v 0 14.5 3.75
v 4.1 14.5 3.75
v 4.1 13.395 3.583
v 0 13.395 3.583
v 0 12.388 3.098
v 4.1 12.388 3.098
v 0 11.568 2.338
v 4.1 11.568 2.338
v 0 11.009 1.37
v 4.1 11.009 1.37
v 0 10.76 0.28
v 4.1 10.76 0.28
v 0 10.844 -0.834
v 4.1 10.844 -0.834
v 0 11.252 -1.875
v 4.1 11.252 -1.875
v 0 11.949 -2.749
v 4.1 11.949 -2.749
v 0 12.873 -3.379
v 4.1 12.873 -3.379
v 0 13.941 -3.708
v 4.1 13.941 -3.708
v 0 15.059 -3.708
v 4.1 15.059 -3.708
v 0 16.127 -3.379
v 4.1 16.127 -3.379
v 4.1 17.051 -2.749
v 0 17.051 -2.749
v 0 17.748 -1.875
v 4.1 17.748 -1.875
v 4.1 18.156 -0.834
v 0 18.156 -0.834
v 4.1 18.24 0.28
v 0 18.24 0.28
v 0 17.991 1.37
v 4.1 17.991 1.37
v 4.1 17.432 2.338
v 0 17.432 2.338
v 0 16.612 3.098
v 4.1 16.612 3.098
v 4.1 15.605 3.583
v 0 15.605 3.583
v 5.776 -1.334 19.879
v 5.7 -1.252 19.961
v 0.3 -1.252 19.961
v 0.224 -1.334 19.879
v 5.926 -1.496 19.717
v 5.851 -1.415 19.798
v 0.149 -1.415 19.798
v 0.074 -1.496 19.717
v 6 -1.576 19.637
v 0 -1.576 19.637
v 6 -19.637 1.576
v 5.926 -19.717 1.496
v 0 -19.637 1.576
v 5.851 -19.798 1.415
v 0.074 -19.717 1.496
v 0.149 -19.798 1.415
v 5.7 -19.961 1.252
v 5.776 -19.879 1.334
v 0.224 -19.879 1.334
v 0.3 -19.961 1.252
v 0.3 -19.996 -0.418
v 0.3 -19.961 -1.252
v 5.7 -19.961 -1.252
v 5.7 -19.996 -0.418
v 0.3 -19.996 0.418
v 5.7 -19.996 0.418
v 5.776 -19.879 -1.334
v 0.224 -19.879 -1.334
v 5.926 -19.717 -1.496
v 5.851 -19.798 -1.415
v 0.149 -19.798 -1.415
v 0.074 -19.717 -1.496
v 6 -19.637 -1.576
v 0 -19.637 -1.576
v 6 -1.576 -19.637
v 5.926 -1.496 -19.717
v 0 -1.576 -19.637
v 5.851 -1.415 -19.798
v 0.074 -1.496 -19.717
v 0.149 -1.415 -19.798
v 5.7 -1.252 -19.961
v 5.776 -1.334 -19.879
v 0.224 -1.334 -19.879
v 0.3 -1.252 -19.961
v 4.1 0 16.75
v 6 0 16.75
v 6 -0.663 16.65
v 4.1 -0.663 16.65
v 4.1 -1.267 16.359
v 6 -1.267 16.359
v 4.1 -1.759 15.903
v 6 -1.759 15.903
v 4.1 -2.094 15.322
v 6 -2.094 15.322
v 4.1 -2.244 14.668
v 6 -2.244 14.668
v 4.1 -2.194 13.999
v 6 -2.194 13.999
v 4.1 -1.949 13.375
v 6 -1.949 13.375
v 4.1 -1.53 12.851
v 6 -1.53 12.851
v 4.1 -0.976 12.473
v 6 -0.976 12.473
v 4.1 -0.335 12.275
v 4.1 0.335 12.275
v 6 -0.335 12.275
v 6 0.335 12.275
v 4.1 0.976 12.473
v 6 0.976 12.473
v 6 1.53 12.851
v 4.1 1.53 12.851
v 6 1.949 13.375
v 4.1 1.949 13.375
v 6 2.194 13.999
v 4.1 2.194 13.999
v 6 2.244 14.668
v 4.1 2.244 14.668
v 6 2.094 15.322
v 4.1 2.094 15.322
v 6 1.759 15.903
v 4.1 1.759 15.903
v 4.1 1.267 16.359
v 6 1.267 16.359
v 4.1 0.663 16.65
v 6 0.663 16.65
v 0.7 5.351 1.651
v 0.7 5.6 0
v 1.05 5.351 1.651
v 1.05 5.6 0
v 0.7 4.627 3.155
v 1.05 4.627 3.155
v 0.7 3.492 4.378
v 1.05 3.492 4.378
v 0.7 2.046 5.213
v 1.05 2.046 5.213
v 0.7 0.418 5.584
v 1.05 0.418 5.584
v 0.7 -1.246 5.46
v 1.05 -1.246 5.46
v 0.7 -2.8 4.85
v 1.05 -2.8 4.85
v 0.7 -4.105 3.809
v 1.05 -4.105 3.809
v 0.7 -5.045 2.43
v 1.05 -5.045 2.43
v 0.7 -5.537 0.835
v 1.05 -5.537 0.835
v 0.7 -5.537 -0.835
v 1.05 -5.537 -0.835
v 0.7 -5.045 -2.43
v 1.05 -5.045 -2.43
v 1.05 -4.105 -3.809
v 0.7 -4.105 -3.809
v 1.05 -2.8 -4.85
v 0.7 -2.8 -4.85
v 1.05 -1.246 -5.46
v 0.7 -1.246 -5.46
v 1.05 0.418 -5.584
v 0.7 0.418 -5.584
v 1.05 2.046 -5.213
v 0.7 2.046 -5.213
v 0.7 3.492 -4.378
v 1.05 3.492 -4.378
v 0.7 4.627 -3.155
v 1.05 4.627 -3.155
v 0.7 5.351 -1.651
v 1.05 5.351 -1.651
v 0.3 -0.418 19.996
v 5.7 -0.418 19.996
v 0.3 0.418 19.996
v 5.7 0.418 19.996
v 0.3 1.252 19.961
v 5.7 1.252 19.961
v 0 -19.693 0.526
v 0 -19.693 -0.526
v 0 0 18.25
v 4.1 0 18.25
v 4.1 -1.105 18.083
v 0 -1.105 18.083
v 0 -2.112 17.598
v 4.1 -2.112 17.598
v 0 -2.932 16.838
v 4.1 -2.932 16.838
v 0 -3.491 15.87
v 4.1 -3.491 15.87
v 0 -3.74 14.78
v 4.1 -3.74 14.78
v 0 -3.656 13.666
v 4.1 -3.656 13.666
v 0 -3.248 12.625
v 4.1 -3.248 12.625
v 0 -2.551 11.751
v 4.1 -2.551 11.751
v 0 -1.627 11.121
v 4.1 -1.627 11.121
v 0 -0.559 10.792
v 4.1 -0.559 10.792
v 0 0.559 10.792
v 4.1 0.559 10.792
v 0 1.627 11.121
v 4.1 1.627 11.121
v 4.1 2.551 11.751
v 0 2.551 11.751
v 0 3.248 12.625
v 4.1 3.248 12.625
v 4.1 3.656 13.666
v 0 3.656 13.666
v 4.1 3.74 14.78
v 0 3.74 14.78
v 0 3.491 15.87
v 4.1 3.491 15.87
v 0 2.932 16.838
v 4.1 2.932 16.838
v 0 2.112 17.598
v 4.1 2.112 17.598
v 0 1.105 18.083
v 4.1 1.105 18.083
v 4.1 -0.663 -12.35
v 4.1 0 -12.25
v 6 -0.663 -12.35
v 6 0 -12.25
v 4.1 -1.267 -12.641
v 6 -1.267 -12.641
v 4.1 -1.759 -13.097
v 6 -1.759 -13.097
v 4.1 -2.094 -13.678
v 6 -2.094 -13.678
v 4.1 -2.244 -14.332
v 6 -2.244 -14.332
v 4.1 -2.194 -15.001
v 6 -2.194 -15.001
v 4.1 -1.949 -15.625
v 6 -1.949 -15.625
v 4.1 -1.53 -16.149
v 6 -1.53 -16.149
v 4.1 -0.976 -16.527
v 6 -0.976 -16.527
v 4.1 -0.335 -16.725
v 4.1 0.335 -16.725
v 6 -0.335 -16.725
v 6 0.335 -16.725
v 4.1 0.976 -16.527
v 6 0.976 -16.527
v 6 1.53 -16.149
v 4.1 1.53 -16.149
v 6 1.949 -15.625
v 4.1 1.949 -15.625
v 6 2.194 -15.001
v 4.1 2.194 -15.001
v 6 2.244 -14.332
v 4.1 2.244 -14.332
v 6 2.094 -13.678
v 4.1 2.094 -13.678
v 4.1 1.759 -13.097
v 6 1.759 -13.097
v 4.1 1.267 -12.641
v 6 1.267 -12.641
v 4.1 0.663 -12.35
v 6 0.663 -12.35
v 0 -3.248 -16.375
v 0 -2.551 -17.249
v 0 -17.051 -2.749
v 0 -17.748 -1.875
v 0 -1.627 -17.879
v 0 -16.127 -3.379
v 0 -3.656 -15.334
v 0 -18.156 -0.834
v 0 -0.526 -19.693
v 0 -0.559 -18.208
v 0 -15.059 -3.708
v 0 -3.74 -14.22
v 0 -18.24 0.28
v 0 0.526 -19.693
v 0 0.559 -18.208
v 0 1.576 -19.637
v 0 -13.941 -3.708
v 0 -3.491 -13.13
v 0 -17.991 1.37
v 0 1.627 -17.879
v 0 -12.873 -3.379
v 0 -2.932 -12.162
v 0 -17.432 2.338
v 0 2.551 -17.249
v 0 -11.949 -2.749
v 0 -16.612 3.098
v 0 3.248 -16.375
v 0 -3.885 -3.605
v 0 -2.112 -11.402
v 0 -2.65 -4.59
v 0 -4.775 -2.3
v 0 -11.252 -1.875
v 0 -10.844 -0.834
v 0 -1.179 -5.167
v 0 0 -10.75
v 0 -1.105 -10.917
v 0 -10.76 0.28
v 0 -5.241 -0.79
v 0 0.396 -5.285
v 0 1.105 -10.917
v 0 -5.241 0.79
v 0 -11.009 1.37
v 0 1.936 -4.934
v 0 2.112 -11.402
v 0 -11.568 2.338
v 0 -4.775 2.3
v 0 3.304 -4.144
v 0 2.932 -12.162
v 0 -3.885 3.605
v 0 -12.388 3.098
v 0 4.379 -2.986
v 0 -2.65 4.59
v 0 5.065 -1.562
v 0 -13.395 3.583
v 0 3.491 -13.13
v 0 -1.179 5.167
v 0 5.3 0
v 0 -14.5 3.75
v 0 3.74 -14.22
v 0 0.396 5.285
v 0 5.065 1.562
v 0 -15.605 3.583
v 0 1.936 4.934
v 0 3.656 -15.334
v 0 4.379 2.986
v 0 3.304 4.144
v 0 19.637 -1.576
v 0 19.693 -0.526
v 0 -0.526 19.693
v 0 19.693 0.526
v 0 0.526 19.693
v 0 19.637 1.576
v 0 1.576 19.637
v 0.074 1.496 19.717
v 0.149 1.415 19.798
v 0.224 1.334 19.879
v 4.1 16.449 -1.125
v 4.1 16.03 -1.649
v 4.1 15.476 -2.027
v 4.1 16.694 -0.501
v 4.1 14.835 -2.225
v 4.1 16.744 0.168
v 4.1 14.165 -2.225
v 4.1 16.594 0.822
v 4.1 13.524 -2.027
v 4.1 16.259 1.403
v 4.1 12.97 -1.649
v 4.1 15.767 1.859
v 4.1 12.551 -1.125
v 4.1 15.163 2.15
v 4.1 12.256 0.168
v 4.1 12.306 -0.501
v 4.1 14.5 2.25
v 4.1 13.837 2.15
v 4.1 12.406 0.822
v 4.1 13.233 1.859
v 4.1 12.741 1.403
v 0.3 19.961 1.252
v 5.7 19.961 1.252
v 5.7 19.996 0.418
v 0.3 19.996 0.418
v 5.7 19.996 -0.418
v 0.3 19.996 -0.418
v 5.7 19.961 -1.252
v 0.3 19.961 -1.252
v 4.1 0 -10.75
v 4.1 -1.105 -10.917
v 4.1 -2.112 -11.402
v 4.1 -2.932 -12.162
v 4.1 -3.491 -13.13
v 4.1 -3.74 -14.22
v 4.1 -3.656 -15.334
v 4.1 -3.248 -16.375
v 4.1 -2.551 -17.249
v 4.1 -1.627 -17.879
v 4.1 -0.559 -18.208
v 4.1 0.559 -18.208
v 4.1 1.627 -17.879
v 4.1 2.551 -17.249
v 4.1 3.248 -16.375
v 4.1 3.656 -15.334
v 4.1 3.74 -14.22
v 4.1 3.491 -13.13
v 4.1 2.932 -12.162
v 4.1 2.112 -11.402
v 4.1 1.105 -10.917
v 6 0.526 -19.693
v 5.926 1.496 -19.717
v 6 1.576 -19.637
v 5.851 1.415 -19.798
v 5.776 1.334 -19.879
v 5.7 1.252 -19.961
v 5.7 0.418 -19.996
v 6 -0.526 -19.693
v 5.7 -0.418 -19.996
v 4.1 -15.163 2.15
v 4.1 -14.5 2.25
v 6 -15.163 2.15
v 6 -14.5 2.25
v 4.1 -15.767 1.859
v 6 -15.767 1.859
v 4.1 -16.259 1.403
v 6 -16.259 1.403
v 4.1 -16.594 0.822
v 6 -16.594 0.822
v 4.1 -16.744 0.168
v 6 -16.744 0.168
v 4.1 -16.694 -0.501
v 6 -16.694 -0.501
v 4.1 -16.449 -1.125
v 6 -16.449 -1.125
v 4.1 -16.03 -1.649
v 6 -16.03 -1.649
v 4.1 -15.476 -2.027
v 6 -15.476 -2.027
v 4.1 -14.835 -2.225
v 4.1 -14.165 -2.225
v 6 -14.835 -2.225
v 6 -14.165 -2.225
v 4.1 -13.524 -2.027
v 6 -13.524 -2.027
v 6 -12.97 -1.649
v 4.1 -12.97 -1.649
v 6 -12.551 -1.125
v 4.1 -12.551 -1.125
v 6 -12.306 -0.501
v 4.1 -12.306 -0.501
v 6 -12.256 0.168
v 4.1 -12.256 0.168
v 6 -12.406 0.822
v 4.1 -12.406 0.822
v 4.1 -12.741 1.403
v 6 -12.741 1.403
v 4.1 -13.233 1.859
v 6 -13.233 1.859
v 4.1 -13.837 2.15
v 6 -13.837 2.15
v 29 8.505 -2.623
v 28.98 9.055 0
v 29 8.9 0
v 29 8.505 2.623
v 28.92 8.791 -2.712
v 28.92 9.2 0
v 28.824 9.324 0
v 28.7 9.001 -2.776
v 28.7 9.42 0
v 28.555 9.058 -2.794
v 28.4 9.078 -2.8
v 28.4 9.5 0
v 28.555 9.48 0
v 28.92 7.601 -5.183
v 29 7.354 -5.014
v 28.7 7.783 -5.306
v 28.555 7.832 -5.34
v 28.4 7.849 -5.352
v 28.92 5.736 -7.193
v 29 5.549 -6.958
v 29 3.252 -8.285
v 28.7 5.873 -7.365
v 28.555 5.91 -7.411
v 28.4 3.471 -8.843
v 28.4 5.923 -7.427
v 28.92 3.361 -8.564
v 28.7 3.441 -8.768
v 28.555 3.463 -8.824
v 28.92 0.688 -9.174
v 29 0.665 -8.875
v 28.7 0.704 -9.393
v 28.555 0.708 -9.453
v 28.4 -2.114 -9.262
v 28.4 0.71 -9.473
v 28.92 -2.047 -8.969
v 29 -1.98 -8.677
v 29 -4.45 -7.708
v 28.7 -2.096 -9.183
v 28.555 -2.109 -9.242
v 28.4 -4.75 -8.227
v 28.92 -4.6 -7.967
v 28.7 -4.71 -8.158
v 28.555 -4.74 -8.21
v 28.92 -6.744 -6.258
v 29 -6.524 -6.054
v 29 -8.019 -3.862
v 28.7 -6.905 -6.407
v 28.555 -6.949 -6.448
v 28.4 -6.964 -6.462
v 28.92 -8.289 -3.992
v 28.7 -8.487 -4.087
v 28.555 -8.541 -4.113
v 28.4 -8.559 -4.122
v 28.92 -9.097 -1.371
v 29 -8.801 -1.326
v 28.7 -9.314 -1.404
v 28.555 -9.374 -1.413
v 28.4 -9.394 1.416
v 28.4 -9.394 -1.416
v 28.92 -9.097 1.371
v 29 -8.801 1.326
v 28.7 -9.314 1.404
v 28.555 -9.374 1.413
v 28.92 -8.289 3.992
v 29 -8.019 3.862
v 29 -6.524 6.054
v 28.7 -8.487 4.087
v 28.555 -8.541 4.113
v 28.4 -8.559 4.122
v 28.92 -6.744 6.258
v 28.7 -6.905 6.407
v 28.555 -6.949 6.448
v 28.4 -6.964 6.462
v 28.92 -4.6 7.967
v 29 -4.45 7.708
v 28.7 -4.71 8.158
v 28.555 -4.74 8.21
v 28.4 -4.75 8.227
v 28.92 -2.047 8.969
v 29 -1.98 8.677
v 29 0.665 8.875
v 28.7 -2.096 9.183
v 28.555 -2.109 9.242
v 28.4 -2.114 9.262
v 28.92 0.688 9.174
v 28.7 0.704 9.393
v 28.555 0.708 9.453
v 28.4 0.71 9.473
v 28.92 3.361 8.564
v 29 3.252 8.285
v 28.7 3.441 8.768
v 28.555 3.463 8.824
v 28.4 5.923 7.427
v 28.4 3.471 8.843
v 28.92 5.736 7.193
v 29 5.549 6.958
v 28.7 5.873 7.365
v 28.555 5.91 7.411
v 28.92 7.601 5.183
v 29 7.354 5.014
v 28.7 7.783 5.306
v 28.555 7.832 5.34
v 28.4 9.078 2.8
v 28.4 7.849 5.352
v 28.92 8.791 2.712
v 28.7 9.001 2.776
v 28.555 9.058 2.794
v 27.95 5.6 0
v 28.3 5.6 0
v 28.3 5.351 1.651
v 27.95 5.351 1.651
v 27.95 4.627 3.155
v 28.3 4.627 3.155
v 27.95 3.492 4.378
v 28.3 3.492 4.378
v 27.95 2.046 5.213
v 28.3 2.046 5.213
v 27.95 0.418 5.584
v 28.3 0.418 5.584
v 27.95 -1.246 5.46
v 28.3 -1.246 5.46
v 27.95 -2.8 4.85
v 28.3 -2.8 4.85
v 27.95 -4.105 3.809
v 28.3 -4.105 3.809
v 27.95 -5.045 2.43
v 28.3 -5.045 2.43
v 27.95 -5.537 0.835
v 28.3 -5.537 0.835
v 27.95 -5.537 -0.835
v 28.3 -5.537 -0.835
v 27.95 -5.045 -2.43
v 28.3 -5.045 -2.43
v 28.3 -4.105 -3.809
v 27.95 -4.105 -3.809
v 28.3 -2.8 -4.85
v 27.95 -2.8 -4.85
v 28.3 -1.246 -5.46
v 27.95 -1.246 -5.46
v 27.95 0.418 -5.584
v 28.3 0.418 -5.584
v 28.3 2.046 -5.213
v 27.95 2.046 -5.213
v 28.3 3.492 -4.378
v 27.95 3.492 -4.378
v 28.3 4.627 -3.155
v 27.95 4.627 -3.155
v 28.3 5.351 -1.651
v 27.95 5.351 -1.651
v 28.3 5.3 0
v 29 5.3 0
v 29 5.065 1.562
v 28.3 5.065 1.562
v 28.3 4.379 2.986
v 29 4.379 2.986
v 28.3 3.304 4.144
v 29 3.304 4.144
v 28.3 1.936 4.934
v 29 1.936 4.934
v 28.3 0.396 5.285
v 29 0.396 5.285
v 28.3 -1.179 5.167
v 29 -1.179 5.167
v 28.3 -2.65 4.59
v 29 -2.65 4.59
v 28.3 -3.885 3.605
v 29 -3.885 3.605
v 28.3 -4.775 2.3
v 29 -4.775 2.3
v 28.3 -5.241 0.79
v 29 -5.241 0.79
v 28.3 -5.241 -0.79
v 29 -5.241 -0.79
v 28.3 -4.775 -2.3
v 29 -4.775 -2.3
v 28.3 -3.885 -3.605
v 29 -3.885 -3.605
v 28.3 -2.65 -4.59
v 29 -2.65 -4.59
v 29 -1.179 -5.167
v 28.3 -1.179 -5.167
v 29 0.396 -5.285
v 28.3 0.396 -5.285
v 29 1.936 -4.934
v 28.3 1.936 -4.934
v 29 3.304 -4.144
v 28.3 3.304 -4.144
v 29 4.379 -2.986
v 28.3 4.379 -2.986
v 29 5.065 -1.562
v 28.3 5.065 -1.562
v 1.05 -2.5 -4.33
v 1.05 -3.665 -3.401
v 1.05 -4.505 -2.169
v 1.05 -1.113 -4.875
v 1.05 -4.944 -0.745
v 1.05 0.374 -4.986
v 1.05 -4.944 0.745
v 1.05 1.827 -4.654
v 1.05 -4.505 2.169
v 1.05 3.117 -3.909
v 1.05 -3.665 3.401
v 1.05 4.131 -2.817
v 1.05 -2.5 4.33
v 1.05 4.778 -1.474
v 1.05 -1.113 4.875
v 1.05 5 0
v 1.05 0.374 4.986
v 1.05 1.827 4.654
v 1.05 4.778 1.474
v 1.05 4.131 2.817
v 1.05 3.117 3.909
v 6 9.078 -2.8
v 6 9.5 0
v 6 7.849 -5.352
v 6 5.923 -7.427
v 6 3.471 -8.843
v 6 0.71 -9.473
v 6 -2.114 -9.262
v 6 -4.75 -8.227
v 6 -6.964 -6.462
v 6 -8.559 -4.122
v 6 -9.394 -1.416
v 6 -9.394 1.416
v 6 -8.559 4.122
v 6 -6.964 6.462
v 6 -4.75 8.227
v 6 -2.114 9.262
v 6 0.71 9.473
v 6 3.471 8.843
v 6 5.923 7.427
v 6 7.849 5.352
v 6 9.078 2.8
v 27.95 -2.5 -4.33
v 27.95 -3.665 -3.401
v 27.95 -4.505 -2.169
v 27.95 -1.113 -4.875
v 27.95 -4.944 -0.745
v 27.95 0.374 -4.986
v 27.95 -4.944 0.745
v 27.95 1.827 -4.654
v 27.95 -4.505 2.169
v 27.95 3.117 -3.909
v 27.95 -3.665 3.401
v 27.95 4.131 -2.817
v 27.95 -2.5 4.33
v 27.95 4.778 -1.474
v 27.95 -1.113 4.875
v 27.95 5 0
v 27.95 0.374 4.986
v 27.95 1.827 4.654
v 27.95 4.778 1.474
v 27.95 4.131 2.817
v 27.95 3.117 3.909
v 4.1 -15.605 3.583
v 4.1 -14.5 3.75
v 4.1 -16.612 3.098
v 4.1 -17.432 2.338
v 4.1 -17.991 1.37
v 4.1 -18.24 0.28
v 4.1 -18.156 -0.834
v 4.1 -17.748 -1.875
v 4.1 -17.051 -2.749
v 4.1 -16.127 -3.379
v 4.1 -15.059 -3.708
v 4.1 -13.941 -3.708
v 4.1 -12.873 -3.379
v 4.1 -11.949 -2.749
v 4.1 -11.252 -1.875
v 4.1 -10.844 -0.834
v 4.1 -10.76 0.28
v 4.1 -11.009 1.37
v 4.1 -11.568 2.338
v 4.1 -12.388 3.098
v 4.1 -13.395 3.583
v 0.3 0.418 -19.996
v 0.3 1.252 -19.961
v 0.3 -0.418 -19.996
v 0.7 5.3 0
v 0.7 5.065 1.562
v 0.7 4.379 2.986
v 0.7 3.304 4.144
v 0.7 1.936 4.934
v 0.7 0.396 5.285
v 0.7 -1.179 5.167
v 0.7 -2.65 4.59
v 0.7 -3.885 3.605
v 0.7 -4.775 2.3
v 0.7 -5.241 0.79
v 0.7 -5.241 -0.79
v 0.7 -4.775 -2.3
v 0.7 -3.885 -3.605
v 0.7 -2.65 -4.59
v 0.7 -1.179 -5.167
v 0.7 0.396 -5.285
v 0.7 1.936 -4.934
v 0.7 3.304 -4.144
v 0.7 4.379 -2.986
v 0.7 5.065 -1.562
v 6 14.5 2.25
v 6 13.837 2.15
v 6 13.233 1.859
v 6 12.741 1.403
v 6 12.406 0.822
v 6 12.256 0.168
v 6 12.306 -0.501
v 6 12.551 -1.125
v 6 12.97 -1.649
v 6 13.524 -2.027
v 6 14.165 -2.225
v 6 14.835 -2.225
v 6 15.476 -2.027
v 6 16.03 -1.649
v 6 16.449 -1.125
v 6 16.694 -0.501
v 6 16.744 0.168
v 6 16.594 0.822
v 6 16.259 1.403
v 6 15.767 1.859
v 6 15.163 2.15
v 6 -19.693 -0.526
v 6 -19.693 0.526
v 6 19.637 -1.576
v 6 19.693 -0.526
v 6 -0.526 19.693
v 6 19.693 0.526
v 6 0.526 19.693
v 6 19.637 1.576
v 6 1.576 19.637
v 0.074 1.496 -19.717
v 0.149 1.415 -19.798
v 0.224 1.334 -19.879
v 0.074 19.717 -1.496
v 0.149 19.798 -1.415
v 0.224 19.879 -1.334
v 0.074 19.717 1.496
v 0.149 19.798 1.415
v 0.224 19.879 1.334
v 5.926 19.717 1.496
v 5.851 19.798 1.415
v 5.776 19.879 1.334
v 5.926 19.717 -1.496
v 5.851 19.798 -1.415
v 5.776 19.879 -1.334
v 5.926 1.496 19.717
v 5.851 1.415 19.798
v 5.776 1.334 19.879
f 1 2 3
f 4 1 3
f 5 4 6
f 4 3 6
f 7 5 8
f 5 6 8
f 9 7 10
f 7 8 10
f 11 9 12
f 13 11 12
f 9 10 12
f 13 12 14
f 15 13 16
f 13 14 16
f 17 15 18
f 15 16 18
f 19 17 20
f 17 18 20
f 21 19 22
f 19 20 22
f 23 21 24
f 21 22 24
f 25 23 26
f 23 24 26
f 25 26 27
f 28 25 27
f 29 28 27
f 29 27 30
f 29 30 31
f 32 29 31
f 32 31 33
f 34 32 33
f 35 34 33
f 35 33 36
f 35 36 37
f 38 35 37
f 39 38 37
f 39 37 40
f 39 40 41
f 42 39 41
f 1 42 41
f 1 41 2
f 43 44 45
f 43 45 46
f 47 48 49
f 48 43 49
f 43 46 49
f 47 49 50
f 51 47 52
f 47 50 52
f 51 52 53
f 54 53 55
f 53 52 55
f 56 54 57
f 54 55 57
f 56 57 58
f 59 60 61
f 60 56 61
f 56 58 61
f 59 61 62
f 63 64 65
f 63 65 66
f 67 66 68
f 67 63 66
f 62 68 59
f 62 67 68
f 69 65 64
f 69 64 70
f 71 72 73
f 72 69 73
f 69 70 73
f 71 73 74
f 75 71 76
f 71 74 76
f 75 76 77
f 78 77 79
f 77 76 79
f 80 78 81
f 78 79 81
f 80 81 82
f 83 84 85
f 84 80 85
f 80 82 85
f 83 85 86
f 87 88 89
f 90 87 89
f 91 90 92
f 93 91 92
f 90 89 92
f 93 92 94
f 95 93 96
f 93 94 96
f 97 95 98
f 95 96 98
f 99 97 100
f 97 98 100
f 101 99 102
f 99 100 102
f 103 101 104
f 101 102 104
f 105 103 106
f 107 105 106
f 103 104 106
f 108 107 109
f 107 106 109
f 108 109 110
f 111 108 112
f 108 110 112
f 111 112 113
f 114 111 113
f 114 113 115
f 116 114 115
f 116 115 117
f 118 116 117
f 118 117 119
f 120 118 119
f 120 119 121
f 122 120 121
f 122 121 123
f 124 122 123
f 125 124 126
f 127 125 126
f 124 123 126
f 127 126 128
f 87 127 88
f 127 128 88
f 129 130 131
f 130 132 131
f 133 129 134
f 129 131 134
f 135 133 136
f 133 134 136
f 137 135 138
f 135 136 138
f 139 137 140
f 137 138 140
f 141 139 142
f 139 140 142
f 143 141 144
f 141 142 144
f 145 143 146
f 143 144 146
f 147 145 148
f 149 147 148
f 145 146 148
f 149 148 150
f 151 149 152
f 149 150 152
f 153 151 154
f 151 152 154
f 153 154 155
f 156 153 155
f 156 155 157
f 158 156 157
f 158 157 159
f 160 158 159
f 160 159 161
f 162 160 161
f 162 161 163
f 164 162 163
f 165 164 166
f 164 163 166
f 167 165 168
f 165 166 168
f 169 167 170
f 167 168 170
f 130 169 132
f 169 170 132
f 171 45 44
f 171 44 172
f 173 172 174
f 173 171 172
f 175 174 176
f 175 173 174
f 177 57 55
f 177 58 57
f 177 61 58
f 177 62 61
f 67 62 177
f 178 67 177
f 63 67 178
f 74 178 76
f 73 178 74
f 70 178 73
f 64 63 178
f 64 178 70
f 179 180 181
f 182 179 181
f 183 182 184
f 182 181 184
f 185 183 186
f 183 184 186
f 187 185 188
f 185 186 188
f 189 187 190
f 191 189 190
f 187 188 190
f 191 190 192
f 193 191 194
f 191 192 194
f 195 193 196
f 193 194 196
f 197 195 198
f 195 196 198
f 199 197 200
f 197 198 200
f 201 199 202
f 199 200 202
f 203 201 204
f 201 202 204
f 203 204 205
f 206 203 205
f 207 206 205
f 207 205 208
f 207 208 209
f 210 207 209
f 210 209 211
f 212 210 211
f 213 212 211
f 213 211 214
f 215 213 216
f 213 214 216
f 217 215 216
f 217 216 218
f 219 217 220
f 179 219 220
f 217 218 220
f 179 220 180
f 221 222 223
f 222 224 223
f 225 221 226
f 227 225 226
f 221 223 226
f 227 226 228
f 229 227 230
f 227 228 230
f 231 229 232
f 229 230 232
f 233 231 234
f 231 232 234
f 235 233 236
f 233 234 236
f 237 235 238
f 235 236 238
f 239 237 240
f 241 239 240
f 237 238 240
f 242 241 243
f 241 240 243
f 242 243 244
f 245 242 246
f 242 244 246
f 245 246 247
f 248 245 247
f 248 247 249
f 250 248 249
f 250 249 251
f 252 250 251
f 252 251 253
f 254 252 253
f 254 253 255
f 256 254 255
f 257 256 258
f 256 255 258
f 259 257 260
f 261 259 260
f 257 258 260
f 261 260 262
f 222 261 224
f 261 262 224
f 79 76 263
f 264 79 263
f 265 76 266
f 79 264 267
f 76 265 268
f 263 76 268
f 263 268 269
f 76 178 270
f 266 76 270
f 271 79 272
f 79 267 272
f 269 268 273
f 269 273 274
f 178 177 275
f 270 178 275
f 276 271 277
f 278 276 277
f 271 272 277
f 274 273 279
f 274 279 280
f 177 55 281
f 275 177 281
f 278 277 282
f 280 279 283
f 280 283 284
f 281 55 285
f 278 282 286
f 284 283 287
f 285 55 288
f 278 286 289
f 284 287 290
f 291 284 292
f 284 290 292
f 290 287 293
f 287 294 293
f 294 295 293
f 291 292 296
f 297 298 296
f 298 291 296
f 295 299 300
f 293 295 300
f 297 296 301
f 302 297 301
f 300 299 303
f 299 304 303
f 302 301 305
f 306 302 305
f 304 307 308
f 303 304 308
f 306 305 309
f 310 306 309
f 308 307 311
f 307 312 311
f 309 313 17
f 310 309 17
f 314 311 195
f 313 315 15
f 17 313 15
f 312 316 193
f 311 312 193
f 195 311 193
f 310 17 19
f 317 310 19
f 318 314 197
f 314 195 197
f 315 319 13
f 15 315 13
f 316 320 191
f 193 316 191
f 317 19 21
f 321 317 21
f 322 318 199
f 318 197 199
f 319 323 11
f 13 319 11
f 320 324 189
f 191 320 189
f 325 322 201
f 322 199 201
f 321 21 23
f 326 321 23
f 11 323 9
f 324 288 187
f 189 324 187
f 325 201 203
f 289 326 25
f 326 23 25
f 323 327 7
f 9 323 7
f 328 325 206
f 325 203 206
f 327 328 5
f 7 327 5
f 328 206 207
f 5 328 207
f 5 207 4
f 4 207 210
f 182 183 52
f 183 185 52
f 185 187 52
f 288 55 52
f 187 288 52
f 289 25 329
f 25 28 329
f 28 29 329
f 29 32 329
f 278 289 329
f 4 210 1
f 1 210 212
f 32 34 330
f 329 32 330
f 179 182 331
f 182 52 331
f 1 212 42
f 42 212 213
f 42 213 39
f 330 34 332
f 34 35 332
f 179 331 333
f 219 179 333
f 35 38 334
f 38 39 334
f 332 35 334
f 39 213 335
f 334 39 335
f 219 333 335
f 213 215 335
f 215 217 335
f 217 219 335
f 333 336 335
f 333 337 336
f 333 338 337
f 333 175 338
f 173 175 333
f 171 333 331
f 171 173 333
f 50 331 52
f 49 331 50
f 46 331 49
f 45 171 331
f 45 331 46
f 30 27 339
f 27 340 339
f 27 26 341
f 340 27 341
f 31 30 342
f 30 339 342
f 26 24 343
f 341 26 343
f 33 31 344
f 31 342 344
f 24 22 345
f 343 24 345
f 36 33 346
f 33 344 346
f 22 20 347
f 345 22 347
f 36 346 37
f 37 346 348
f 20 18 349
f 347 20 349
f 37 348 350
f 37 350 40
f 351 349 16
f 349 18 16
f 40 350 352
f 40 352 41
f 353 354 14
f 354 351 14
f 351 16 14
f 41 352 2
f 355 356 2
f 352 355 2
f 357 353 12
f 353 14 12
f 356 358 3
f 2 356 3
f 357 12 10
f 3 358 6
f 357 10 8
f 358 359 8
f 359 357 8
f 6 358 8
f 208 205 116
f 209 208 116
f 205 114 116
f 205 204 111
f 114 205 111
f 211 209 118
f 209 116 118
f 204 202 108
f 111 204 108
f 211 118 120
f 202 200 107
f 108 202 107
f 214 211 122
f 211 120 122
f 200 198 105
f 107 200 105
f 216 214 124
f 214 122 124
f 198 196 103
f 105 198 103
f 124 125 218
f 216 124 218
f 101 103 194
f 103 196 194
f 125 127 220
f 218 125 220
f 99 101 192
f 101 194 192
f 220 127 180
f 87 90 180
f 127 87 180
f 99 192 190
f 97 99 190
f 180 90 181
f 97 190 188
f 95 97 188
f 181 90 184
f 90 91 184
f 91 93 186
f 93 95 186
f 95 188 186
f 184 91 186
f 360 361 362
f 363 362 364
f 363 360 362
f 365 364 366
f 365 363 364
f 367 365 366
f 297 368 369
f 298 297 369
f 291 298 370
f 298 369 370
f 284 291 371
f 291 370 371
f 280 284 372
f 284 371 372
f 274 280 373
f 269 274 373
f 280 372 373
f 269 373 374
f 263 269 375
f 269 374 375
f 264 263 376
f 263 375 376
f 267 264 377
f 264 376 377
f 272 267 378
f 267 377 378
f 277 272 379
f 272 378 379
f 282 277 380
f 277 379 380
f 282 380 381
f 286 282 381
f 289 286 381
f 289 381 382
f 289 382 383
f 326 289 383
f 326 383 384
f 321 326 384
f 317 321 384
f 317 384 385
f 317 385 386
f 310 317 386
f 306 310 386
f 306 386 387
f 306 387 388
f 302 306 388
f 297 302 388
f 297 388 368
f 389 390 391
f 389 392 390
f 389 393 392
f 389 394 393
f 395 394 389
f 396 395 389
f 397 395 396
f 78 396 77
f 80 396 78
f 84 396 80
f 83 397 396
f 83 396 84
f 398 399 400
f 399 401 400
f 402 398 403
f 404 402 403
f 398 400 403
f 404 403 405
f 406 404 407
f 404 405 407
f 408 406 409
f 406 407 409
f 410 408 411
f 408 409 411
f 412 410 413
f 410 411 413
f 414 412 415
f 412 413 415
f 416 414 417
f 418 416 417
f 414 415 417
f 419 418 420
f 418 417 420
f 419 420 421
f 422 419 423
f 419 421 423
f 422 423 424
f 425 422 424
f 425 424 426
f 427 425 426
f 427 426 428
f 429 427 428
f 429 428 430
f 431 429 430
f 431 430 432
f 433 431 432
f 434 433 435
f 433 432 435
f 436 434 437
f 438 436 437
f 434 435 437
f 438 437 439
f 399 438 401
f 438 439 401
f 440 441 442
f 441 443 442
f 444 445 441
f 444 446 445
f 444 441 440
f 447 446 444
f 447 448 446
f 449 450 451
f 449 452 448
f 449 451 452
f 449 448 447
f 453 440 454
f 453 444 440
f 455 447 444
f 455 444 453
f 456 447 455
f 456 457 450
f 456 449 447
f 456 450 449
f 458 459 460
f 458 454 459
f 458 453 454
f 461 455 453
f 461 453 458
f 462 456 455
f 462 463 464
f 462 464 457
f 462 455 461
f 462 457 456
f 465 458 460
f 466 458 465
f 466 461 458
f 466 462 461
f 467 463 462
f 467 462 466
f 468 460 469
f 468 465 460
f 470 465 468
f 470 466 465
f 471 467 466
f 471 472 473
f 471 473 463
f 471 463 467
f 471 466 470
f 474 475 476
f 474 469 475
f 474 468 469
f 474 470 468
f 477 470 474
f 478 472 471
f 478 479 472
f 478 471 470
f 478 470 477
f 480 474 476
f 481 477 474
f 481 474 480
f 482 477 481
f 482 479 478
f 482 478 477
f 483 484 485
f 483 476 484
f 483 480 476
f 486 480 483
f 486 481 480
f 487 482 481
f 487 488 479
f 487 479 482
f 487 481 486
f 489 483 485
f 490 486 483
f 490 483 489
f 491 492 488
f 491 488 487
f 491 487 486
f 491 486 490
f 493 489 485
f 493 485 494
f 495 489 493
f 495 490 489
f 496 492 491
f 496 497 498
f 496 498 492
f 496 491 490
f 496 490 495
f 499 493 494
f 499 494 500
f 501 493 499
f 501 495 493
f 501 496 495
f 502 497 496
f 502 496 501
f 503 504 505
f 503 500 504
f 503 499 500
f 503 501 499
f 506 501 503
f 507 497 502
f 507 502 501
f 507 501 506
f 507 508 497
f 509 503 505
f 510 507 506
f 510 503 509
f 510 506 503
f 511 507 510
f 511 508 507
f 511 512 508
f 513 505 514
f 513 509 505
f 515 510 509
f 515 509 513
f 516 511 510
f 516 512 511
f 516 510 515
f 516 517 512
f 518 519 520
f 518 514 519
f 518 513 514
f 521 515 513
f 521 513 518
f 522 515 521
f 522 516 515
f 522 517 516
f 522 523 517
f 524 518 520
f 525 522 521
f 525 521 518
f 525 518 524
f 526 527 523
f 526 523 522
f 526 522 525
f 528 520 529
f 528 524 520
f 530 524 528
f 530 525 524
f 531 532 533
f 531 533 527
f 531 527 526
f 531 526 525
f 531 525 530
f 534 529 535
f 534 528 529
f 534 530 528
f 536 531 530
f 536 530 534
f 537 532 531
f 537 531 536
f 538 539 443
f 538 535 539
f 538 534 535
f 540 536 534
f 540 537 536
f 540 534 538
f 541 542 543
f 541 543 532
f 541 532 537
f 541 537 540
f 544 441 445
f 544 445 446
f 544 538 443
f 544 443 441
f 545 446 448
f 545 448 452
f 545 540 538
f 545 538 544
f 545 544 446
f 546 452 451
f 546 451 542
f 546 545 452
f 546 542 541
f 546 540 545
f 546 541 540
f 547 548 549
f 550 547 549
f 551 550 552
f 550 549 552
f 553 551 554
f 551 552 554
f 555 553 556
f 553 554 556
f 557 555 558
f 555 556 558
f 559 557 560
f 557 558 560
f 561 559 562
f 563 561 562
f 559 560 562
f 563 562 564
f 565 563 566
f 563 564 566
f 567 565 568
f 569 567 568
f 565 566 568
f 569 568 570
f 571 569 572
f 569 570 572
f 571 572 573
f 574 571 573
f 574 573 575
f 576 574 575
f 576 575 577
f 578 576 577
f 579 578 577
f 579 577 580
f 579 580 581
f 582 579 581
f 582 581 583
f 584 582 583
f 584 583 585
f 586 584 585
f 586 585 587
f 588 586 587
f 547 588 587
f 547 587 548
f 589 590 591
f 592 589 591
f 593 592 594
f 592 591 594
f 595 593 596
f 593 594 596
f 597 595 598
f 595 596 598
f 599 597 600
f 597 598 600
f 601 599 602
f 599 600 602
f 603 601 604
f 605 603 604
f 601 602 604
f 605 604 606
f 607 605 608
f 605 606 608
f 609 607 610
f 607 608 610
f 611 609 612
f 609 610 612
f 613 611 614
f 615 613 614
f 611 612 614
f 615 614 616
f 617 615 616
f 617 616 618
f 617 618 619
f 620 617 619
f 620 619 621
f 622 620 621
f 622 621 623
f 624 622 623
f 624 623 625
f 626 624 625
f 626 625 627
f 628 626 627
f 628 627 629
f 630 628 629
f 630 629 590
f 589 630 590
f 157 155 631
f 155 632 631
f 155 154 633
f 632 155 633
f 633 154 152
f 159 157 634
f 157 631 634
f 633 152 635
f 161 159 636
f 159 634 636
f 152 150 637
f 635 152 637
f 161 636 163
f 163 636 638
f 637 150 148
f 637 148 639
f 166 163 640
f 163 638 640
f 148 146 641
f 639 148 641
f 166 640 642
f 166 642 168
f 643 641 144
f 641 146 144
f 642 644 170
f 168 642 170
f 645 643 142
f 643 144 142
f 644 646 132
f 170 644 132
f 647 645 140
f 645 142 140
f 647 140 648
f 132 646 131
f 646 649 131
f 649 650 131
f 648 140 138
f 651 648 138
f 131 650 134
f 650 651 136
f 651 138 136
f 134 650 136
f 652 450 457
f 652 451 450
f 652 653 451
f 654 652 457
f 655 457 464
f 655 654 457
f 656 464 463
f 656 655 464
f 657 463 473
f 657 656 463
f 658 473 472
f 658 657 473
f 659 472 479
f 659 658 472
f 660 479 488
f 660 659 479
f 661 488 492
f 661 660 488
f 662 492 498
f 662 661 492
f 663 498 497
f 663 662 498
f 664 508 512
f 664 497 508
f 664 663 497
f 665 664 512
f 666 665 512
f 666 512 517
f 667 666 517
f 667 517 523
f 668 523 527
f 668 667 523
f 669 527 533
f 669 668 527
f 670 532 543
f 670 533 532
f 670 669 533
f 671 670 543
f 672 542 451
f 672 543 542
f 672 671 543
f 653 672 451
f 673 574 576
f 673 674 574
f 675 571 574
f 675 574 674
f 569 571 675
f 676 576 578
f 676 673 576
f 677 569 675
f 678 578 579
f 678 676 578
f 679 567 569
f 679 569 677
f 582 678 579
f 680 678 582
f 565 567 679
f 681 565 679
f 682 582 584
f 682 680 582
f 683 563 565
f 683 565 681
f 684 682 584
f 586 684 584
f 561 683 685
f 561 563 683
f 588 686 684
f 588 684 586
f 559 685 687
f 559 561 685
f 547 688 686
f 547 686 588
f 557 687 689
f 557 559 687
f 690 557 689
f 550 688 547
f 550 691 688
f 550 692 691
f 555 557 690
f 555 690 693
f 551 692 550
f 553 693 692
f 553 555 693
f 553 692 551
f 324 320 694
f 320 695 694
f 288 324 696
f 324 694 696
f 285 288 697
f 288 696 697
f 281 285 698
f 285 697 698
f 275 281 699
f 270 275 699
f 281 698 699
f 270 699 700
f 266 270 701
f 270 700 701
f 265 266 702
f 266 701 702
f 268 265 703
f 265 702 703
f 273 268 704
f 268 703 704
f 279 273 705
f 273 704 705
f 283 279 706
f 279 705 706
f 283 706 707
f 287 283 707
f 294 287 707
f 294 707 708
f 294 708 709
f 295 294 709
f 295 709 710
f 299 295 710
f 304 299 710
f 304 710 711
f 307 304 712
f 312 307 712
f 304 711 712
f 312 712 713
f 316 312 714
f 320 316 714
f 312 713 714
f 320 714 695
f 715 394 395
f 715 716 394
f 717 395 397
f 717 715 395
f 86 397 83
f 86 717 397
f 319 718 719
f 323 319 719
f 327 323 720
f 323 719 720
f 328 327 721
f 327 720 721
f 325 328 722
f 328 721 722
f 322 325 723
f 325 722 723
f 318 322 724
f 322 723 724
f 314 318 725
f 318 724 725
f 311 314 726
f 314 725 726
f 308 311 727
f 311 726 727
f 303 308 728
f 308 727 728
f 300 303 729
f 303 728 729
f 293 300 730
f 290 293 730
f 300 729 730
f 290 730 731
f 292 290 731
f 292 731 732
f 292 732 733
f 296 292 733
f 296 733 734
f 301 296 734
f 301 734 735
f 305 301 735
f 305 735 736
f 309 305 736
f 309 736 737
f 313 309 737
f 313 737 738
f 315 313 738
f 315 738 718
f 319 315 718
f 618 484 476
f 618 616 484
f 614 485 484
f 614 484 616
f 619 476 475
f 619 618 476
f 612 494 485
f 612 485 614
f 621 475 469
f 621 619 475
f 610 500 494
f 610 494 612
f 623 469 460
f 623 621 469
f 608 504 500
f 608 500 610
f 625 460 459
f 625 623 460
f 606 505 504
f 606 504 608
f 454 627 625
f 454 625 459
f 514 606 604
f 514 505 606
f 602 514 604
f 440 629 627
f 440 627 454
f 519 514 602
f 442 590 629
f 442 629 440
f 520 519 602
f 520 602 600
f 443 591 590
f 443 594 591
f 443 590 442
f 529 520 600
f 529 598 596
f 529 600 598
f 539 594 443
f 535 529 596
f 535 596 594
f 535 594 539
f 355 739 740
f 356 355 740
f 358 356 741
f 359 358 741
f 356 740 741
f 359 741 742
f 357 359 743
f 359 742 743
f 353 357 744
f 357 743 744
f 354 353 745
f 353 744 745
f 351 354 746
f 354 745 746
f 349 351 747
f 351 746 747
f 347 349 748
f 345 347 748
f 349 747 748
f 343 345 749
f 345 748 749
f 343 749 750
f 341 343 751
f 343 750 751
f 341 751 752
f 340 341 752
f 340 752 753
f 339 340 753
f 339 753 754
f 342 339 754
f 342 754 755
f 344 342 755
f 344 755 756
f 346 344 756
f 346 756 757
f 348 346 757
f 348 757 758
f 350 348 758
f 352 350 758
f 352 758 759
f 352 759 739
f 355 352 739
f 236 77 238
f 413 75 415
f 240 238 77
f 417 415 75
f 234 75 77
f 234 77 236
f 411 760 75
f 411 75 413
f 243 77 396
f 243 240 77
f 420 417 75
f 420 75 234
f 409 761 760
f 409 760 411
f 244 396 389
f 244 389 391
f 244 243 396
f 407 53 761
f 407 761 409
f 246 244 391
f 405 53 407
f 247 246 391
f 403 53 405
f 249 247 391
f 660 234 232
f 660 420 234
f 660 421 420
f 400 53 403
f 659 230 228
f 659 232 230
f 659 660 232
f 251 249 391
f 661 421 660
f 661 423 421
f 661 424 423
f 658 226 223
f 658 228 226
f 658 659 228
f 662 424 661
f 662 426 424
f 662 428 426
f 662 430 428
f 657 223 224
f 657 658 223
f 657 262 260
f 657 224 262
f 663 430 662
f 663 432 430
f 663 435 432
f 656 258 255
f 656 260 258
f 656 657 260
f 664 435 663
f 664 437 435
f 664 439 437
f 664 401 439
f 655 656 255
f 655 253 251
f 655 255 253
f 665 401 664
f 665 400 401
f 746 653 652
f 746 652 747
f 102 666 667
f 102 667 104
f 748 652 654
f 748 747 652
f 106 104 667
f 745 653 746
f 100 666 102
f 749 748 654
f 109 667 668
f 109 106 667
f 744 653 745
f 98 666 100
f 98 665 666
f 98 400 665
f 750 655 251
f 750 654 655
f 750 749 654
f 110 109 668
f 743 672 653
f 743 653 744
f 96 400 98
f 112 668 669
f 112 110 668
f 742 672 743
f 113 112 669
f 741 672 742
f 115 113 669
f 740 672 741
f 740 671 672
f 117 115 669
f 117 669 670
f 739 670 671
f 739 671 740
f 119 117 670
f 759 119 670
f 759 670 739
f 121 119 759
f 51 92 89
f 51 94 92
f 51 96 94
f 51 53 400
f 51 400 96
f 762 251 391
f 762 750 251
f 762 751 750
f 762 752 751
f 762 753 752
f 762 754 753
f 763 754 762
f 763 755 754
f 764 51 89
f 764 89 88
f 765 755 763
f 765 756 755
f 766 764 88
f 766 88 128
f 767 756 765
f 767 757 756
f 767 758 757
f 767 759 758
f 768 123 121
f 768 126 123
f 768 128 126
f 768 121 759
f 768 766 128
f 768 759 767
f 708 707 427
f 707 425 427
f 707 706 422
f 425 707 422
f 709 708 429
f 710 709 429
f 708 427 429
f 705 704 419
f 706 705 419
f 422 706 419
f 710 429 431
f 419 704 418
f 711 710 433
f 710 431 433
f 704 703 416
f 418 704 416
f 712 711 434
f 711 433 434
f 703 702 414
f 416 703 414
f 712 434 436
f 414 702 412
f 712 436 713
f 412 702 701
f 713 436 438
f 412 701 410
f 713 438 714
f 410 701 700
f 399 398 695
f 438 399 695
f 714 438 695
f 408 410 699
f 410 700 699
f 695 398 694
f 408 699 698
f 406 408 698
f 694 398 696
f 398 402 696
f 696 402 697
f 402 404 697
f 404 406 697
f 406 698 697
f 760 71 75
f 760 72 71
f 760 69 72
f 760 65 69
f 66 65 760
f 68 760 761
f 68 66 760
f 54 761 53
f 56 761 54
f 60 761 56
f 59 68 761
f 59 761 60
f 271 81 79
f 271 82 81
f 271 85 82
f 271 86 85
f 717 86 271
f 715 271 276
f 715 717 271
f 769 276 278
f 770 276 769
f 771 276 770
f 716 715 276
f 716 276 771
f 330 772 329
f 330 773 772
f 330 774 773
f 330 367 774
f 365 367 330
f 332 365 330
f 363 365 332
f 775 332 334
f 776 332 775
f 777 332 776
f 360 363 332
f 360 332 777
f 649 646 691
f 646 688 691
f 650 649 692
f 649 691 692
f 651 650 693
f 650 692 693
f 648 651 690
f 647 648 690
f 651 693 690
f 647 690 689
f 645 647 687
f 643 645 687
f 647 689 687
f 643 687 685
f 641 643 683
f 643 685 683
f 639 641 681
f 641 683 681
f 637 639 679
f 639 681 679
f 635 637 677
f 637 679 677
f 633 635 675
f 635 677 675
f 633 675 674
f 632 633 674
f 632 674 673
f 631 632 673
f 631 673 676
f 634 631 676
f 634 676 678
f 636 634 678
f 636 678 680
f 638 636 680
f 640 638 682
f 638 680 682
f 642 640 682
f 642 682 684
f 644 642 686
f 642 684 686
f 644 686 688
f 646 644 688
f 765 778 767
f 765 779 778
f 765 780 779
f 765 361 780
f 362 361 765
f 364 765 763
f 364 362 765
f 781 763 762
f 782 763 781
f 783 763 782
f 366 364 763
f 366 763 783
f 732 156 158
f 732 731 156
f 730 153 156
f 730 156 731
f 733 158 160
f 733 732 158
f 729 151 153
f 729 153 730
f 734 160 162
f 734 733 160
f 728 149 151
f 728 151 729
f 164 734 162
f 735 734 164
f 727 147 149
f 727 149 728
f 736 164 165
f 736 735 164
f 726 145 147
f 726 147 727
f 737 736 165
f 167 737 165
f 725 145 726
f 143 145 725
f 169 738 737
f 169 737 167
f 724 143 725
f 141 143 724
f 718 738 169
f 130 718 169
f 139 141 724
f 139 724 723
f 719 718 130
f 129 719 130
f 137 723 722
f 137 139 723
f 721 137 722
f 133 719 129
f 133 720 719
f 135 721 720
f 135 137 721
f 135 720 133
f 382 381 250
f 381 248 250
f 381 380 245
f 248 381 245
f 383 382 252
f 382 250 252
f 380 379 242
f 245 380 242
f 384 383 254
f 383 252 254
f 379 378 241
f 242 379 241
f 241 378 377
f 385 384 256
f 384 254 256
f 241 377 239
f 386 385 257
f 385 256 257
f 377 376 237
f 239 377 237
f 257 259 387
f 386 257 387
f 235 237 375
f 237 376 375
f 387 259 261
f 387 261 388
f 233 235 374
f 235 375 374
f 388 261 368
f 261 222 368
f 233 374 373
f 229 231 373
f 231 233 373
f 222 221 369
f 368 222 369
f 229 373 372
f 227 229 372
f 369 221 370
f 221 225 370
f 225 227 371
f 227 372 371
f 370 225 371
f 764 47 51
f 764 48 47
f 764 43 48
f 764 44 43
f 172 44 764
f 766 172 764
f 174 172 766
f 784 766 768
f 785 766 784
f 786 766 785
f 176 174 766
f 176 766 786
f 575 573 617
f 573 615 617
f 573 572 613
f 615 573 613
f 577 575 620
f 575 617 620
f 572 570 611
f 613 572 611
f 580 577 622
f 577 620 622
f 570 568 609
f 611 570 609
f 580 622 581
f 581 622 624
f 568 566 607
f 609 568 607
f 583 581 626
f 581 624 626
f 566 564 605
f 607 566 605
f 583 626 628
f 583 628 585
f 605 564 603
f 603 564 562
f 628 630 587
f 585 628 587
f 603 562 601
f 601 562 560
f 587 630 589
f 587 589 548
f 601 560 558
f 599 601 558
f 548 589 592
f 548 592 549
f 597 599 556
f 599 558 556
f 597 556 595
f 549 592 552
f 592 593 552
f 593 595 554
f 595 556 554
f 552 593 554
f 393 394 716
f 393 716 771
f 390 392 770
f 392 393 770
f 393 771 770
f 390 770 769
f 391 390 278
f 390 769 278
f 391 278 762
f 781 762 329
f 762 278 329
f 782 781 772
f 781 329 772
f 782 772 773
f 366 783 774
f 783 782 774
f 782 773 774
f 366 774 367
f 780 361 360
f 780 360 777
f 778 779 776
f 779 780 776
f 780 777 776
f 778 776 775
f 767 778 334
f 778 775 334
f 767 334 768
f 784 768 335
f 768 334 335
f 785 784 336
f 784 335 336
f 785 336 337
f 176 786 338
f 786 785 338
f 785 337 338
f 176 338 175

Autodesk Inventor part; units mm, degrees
sketch "Sketch_1" plane through (0, 0, 0) normal (0, 0, 1) x (1, 0, 0)
  line L0 (29, 0) -> (0, 0)
  line L1 (0, 5.3) -> (0.7, 5.3)
  line L2 (0.7, 5.3) -> (0.7, 5.6)
  line L3 (0.7, 5.6) -> (1.05, 5.6)
  line L4 (1.05, 5.6) -> (1.05, 5)
  line L5 (1.05, 5) -> (27.95, 5)
  line L6 (27.95, 5) -> (27.95, 5.6)
  line L7 (27.95, 5.6) -> (28.3, 5.6)
  line L8 (28.3, 5.6) -> (28.3, 5.3)
  line L9 (28.3, 5.3) -> (29, 5.3)
  line L10 (29, 5.3) -> (29, 8.9)
  arc A0 (29, 8.9) -> (28.4, 9.5) centre (28.4, 8.9) ccw
  line L11 (28.4, 9.5) -> (6, 9.5)
  line L12 (6, 9.5) -> (6, 19.7)
  line L13 (6, 19.7) -> (5.7, 20)
  line L14 (5.7, 20) -> (0.3, 20)
  line L15 (0.3, 20) -> (0, 19.7)
  line L16 (0, 19.7) -> (0, 5.3)
revolve "Revolution1" add sketch "Sketch_1" angle 360 about axis through (29, 0, 0) along (1, 0, 0)
sketch "Sketch_2" plane through (0, 0, 0) normal (1, 0, 0) x (0, 1, 0)
  line L0 (-30, 30) -> (-30, -30)
  line L1 (-30, -30) -> (30, -30)
  line L2 (30, -30) -> (30, 30)
  line L3 (30, 30) -> (-30, 30)
  line L4 (-1.2132, 20) -> (-20, 1.2132)
  line L5 (-20, 1.2132) -> (-20, -1.2132)
  line L6 (-20, -1.2132) -> (-1.2132, -20)
  line L7 (-1.2132, -20) -> (1.2132, -20)
  line L8 (1.2132, -20) -> (20, -1.2132)
  line L9 (20, -1.2132) -> (20, 1.2132)
  line L10 (20, 1.2132) -> (1.2132, 20)
  line L11 (1.2132, 20) -> (-1.2132, 20)
extrude "Extrusion1" cut sketch "Sketch_2" along normal blind 6
sketch "Sketch3" plane through (0, 0, 0) normal (-1, 0, 0) x (0, 0, 1)
  point P0 (0, 14.5)
hole "Hole1" at (0, 14.5, 0) direction (1, 0, 0) diameter 4.5 depth 6 counterbore diameter 7.5 counterbore depth 4.1
sketch "Sketch4" plane through (0, 0, 0) normal (-1, 0, 0) x (0, 0, 1)
  point P0 (0, -14.5)
hole "Hole2" at (0, -14.5, 0) direction (1, 0, 0) diameter 4.5 depth 6 counterbore diameter 7.5 counterbore depth 4.1
sketch "Sketch5" plane through (0, 0, 0) normal (-1, 0, 0) x (0, 0, 1)
  point P0 (-14.5, 0)
hole "Hole3" at (0, 0, -14.5) direction (1, 0, 0) diameter 4.5 depth 6 counterbore diameter 7.5 counterbore depth 4.1
sketch "Sketch6" plane through (0, 0, 0) normal (-1, 0, 0) x (0, 0, 1)
  point P0 (14.5, 0)
hole "Hole4" at (0, 0, 14.5) direction (1, 0, 0) diameter 4.5 depth 6 counterbore diameter 7.5 counterbore depth 4.1
ref_plane "Combination_Module_XY" through (0, 0, 0) normal (1, 0, 0) x (0, 0, -1)
ref_plane "Combination_Module_YZ" through (0, 0, 0) normal (0, 0, -1) x (0, 1, 0)
ref_plane "Combination_Module_ZX" through (0, 0, 0) normal (0, 1, 0) x (1, 0, 0)
properties part number "C-LHFS10"
